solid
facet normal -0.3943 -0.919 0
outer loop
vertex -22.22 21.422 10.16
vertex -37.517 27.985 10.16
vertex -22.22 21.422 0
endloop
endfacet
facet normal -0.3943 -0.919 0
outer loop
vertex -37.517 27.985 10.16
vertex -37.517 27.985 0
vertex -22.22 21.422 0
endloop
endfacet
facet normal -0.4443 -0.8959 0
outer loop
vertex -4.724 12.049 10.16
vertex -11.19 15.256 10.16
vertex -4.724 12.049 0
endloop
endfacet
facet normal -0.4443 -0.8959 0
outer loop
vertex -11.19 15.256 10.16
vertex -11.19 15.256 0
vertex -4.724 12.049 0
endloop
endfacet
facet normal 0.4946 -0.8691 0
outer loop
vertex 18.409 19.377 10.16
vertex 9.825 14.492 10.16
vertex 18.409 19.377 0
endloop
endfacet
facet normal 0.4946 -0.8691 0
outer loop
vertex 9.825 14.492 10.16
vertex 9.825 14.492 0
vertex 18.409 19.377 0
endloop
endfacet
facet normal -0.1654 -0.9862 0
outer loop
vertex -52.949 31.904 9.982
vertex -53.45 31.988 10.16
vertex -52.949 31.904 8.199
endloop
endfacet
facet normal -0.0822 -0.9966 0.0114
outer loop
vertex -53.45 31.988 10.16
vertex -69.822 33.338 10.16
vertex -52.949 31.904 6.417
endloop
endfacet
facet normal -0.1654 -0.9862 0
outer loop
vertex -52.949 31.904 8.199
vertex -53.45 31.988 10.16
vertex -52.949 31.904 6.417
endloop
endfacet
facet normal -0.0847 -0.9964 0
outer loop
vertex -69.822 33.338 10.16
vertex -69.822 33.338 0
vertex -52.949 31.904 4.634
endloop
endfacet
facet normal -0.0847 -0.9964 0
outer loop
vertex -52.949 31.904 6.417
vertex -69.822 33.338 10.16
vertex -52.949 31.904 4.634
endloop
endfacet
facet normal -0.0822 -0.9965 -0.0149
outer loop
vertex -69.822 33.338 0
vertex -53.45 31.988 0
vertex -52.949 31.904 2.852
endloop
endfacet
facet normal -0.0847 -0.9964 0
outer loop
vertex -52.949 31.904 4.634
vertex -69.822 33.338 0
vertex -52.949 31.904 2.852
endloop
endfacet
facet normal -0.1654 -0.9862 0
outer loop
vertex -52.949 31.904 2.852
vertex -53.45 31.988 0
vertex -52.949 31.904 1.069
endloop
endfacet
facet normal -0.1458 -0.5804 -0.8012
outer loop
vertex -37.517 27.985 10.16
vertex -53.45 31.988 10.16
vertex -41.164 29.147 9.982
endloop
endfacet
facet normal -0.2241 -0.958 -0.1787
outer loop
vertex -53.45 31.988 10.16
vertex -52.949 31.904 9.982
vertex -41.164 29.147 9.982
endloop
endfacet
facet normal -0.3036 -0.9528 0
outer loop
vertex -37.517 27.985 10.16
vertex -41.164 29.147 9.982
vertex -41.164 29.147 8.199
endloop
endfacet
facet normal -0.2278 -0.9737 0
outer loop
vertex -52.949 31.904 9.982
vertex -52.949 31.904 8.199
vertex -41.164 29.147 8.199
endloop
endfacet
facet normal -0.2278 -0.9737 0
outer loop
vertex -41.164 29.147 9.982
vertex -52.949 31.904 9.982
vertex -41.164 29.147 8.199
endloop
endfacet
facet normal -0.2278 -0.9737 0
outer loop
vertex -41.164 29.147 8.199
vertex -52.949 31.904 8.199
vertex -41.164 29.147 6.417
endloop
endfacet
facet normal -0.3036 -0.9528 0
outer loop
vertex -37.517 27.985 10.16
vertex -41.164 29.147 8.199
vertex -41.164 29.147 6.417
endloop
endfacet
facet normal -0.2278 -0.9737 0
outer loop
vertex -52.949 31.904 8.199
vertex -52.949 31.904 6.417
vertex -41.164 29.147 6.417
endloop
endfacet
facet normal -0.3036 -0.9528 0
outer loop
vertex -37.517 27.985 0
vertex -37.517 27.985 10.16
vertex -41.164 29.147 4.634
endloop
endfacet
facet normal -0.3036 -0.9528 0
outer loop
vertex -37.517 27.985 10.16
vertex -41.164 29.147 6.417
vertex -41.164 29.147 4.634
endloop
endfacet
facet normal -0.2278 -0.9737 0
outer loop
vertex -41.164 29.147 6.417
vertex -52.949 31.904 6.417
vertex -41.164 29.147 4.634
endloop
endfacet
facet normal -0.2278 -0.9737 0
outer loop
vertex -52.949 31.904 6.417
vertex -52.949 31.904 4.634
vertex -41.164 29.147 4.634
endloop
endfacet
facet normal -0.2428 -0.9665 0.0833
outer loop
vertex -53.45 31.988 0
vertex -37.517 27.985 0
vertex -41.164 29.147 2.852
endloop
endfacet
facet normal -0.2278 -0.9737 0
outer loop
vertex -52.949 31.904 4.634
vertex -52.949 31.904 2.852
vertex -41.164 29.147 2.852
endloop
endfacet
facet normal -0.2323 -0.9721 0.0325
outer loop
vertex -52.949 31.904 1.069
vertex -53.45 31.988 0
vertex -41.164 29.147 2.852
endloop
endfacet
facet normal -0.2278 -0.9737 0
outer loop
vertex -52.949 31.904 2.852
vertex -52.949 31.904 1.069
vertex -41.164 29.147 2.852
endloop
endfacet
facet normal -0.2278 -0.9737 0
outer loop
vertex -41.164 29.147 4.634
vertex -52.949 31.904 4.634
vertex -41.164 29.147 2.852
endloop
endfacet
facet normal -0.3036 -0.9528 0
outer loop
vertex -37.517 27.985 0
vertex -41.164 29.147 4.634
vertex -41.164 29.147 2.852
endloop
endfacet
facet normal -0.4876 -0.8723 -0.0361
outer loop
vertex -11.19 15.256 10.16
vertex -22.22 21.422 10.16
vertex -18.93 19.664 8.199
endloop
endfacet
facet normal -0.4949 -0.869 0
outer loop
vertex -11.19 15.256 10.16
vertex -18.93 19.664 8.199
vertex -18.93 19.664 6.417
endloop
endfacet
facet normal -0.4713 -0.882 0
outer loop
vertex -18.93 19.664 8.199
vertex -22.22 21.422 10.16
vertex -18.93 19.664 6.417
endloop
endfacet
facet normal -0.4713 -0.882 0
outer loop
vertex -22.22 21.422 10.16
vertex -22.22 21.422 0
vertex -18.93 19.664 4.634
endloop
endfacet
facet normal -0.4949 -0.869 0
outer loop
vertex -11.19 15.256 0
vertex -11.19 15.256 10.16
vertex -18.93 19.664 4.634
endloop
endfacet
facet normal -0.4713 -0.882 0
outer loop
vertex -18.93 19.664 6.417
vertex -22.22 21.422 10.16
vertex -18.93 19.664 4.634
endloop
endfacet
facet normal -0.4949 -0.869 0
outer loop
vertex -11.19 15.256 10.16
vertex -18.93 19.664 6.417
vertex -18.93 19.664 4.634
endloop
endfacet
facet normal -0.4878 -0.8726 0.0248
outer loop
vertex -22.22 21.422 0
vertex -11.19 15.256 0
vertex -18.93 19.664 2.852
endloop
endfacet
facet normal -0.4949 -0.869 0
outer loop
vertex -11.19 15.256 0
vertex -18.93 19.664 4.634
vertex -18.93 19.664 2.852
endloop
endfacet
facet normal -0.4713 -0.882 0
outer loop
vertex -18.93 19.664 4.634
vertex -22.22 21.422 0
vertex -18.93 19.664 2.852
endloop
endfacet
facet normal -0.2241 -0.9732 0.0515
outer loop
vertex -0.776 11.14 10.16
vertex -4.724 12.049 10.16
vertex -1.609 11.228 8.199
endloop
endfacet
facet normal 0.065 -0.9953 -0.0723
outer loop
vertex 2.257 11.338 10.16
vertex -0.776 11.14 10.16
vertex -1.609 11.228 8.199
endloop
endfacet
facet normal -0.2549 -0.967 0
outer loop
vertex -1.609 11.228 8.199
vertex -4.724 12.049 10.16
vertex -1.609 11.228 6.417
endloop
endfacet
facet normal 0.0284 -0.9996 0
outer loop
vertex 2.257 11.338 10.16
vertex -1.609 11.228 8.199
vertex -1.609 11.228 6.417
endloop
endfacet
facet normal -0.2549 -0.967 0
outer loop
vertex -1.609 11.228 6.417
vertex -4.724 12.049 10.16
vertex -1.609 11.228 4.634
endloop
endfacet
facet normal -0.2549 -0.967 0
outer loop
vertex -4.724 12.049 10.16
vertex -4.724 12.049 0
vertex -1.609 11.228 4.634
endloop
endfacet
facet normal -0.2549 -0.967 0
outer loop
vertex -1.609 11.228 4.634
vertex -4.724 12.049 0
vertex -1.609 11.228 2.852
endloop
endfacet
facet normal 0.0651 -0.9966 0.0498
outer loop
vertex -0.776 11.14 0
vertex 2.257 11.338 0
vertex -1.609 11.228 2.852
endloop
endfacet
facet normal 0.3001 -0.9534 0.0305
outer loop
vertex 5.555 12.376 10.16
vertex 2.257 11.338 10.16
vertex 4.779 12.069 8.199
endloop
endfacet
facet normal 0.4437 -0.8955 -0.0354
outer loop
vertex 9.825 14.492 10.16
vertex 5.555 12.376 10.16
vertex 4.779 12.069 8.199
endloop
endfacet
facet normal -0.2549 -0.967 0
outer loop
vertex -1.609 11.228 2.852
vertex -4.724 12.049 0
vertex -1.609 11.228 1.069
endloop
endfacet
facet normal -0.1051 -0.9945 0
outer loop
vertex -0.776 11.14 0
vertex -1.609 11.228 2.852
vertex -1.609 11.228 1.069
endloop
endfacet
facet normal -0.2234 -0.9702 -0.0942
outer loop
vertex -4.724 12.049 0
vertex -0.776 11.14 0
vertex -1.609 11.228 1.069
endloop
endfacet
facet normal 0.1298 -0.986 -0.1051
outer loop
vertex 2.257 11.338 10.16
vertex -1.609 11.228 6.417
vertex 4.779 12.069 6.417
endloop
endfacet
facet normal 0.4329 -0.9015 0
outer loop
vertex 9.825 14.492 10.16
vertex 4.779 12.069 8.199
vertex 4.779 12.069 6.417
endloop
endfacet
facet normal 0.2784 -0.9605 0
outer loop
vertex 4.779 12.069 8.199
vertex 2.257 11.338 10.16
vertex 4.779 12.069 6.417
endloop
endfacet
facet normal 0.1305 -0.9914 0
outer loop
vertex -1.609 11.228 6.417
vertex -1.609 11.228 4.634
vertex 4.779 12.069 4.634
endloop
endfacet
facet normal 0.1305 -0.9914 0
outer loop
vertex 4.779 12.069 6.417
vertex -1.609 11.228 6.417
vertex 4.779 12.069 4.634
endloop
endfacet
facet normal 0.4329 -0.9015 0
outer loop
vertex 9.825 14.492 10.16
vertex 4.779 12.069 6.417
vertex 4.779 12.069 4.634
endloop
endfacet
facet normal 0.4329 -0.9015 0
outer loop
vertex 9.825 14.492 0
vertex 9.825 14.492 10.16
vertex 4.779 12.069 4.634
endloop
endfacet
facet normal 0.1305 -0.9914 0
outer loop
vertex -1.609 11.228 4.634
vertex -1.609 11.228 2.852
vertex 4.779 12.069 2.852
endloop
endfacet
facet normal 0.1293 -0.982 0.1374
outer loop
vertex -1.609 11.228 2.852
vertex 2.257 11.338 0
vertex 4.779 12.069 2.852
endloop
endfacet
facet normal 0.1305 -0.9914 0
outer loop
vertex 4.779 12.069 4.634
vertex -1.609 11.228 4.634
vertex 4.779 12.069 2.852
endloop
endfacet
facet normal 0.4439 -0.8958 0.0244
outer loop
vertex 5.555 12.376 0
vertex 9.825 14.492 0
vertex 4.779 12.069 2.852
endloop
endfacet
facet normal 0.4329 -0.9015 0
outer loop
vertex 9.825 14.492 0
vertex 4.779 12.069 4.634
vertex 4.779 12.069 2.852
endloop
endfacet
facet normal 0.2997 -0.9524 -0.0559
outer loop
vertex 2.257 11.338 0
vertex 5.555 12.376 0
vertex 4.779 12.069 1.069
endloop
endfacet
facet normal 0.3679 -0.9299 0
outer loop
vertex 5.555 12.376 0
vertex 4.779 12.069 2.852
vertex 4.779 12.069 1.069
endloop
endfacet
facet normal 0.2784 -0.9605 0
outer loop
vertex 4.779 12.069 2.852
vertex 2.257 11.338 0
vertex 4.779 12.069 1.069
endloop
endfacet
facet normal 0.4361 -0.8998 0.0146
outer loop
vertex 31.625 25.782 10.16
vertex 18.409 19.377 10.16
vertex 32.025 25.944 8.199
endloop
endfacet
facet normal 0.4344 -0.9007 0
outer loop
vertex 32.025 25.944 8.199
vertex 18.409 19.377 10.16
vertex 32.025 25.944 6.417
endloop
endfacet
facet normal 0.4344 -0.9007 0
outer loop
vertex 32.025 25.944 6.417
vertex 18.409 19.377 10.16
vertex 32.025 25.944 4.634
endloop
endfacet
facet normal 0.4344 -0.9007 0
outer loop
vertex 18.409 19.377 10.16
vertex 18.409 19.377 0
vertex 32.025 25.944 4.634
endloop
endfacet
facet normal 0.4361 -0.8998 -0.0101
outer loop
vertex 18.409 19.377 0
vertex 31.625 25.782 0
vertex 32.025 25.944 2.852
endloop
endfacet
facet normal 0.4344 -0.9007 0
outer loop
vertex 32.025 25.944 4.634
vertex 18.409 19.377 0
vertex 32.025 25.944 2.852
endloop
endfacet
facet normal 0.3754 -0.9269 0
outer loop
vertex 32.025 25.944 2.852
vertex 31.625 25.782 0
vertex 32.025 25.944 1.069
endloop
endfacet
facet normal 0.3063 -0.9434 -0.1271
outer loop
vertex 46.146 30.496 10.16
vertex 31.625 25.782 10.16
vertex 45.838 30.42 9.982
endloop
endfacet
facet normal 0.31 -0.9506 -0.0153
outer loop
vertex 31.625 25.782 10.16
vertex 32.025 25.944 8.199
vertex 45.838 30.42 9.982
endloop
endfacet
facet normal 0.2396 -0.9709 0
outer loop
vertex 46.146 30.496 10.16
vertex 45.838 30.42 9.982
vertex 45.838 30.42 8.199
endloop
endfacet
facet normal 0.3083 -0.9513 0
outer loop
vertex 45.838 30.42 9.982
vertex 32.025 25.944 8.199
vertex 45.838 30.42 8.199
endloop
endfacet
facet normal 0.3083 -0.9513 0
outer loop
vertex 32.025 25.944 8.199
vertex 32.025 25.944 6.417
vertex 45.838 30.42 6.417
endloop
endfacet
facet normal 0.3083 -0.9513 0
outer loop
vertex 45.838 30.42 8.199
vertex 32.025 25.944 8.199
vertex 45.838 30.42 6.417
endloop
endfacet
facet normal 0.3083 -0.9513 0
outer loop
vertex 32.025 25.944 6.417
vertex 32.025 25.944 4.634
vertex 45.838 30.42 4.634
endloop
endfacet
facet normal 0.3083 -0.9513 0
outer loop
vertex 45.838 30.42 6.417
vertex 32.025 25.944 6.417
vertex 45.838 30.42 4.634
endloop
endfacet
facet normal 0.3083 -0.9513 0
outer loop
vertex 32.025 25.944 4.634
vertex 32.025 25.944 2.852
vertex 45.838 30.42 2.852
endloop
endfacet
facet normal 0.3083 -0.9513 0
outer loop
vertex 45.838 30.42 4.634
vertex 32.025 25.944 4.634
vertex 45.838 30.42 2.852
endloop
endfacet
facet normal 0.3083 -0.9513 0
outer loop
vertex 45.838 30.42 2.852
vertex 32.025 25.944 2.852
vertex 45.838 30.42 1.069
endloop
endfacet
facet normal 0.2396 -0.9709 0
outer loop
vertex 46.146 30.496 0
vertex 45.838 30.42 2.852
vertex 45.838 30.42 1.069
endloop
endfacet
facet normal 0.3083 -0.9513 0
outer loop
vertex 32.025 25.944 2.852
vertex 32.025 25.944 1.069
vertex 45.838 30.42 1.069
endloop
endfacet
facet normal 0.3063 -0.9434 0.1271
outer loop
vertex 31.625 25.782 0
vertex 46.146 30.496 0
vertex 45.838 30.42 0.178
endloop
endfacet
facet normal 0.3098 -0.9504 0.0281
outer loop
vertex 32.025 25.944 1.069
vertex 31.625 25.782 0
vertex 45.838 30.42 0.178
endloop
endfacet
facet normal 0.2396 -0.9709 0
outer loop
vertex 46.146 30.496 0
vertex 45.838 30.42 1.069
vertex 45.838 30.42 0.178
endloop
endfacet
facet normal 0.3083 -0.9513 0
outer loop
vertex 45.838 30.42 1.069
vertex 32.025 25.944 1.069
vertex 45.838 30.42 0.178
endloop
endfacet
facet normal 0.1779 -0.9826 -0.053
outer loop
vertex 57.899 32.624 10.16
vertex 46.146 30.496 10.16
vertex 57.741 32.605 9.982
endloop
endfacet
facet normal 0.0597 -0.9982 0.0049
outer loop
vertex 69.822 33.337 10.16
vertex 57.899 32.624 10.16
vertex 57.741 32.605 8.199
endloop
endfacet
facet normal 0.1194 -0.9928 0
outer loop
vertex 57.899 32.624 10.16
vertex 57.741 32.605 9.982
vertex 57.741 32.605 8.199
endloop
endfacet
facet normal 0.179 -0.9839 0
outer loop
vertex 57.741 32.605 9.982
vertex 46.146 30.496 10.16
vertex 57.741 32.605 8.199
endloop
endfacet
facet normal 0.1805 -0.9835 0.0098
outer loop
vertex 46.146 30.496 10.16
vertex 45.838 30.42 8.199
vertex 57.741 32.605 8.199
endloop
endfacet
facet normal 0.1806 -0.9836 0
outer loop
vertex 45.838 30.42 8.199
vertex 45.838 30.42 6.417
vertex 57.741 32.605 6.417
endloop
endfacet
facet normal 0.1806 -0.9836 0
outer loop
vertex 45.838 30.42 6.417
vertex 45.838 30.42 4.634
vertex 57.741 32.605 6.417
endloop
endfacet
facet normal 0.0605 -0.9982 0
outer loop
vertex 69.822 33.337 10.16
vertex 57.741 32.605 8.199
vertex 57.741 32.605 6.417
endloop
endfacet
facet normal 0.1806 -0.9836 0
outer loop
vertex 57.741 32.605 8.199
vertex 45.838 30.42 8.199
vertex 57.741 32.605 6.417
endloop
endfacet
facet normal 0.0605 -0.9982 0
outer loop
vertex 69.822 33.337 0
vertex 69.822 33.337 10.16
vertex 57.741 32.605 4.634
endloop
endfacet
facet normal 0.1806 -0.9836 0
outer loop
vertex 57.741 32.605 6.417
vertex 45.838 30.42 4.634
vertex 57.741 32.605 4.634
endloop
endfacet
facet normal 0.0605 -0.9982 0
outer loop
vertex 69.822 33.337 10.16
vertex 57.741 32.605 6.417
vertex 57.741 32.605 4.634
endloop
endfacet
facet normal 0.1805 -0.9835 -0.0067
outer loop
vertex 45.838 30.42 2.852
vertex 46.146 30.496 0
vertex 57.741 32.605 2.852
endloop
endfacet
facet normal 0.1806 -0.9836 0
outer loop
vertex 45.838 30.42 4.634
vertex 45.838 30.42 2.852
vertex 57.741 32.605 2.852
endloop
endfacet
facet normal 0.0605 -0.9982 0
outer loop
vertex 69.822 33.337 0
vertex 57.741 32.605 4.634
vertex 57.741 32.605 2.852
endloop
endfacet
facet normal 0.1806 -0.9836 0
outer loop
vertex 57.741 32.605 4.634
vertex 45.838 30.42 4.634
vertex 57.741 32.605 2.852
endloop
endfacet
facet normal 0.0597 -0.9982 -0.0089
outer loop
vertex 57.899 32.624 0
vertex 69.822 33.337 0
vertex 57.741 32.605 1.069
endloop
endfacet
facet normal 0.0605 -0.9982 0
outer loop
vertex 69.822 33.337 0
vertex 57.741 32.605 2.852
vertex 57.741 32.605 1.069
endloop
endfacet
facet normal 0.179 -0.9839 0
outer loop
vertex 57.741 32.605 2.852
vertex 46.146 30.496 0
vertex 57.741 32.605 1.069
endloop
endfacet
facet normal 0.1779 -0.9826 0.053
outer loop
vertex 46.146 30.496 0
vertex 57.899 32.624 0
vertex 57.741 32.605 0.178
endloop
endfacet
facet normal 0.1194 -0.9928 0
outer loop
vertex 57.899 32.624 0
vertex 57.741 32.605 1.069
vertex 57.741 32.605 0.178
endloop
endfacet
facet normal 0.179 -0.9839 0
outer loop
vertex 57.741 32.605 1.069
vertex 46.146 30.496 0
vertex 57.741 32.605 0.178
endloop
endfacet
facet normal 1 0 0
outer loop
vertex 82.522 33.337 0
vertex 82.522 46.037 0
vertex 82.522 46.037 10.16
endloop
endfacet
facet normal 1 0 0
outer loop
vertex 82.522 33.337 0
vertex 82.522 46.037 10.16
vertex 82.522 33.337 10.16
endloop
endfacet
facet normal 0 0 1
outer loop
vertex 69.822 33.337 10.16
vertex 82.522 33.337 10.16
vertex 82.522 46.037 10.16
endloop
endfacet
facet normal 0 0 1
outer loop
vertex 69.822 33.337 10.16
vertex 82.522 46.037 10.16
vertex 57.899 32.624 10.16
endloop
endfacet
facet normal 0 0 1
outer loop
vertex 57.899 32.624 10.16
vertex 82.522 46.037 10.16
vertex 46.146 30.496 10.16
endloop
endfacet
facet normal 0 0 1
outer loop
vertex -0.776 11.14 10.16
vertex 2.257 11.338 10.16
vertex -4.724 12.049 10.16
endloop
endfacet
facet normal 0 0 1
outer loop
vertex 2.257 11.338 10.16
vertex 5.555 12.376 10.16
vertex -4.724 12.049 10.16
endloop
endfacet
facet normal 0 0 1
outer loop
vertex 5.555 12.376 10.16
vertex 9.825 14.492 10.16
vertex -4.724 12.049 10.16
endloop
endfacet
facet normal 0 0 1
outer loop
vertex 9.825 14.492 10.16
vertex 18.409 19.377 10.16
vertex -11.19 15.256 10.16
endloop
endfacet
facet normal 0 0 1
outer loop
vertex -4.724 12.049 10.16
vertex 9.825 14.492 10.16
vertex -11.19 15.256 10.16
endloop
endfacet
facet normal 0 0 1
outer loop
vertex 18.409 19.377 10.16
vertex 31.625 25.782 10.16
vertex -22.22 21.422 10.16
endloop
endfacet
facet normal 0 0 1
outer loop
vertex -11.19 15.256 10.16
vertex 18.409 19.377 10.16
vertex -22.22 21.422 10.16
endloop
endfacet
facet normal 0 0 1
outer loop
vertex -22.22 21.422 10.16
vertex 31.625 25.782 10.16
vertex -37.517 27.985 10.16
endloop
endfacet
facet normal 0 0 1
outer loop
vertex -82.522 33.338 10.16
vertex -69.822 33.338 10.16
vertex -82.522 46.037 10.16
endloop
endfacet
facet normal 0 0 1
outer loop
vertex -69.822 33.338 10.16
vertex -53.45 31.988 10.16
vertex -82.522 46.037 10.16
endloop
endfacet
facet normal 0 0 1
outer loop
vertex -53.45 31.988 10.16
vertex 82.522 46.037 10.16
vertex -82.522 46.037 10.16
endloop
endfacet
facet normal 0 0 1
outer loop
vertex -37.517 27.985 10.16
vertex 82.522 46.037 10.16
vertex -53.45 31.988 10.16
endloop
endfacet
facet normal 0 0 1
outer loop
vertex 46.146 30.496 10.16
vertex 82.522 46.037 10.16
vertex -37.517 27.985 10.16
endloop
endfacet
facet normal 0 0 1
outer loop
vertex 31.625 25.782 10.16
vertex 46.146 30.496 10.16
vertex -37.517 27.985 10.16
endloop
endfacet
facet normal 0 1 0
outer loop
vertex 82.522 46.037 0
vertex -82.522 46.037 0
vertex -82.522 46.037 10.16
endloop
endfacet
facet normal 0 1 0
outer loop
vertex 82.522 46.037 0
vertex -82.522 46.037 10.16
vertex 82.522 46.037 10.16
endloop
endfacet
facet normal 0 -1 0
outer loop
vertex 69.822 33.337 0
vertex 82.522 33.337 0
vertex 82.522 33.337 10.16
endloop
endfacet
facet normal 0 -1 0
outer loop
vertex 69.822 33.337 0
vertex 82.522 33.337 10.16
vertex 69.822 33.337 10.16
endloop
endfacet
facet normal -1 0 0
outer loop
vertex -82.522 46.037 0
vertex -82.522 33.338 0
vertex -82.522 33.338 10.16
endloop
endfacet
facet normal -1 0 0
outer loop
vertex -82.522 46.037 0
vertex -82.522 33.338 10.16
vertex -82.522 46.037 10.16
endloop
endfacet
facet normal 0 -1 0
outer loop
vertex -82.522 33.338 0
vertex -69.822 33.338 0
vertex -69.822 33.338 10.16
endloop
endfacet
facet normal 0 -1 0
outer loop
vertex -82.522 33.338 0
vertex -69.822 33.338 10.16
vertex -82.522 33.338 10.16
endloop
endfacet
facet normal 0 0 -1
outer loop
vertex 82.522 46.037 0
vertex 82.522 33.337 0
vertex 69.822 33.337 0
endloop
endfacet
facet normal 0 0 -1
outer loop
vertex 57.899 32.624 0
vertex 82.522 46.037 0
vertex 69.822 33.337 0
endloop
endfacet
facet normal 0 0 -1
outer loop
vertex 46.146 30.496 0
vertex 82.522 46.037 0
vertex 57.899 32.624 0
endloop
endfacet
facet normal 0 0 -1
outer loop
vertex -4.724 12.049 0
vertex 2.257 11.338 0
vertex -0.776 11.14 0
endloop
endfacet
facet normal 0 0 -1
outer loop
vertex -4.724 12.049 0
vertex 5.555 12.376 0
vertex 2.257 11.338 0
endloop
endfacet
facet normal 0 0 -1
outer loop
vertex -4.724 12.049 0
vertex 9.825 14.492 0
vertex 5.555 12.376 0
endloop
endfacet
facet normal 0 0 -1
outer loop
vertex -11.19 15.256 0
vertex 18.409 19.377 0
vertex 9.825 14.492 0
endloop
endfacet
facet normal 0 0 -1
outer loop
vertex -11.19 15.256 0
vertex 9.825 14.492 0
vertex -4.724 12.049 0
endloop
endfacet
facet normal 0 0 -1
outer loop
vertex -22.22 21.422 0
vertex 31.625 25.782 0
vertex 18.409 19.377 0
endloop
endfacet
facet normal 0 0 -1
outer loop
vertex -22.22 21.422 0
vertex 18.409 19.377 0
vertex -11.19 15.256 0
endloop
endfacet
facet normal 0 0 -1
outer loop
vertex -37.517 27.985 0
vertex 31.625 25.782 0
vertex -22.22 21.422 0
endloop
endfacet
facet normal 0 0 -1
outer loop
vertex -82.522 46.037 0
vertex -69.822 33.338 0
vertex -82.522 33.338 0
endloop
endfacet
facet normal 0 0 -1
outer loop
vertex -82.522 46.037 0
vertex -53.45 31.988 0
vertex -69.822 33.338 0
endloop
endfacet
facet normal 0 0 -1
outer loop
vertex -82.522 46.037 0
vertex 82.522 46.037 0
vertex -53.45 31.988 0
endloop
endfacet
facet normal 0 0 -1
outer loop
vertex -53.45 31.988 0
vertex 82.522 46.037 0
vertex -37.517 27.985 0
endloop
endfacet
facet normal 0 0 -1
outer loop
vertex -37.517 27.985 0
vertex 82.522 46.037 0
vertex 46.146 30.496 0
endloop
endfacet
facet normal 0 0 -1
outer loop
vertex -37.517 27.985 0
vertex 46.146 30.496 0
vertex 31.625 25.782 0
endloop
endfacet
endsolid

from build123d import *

# Parameters (mm, degrees)
BOSS_EXTRUDE1_DEPTH = 10.16


with BuildPart() as part:
    # Sketch2 → Boss-Extrude1 (new body)
    with BuildSketch(Plane.XY):
        with BuildLine():
            Line((-69.821896726, 33.3375), (-82.521896726, 33.3375))
            Line((-82.521896726, 33.3375), (-82.521896726, 46.037499958))
            Line((-82.521896726, 46.037499958), (82.521896726, 46.037499958))
            Line((82.521896726, 46.037499958), (82.521896726, 33.337499958))
            Line((82.521896726, 33.337499958), (69.821896726, 33.337499958))
            add(Edge.make_bspline(
                [(-69.821896726, 33.3375), (-69.695748082, 33.337499958), (-69.444014878, 33.33688898), (-68.974776454, 33.334139576), (-68.311523611, 33.326807968), (-67.535738646, 33.313061622), (-66.649871791, 33.289235879), (-65.583119966, 33.250751769), (-64.375109134, 33.192119398), (-63.166065476, 33.118845233), (-61.958257755, 33.030940192), (-60.75156183, 32.928417725), (-58.340858198, 32.694168713), (-55.636700095, 32.354076931), (-52.04746615, 31.784437981), (-47.597259295, 30.87442217), (-44.068683145, 30.003709231), (-40.578319771, 28.992751035), (-37.698257404, 28.058512705), (-35.412490367, 27.256928735), (-33.146112621, 26.402109783), (-30.899989094, 25.495391202), (-28.118713815, 24.298818506), (-24.824137204, 22.766002302), (-21.044263598, 20.845993076), (-16.988495065, 18.604884197), (-13.163922242, 16.384998059), (-9.682433774, 14.378110033), (-6.752766683, 12.839370164), (-4.260575031, 11.818773782), (-2.289648997, 11.300020037), (-0.727513295, 11.098155491), (0.727513365, 11.098155139), (2.289648769, 11.300020508), (4.260575544, 11.818772947), (6.752765579, 12.839371822), (9.682435908, 14.378106921), (13.163918453, 16.385003517), (16.988501351, 18.604875175), (21.044252982, 20.84600832), (25.364138003, 23.040262643), (29.22052055, 24.802279565), (32.579499149, 26.188445915), (35.412494909, 27.256909268), (37.698265231, 28.058522908), (40.578297255, 28.992744505), (44.068728971, 30.00371395), (48.185272464, 31.019537163), (52.346368543, 31.835595144), (55.937275824, 32.390662735), (58.943373068, 32.756370776), (61.353326154, 32.990636746), (63.469107465, 33.144482739), (65.279425319, 33.239756175), (66.64951597, 33.28923593), (67.535784341, 33.313061615), (68.311545278, 33.326807964), (68.974773229, 33.334139576), (69.444018374, 33.33688898), (69.695748082, 33.337499958), (69.821896726, 33.337499958)],
                knots=[0.083325531, 0.083325531, 0.083325531, 0.083325531, 0.083325531, 0.086723077, 0.090120623, 0.093518169, 0.096915715, 0.103710808, 0.1105059, 0.117300992, 0.124096085, 0.130891177, 0.137686269, 0.14448136, 0.178456812, 0.192046993, 0.219227344, 0.246407696, 0.259997928, 0.273588159, 0.287178391, 0.300768623, 0.314358811, 0.327948999, 0.355129375, 0.382309728, 0.409490081, 0.431935904, 0.454381728, 0.472501988, 0.483716791, 0.492234559, 0.5, 0.507765441, 0.516283209, 0.527498012, 0.545618272, 0.568064096, 0.590509919, 0.617690272, 0.644870625, 0.672051001, 0.699231377, 0.712821609, 0.726411841, 0.740002072, 0.753592304, 0.780772656, 0.807953007, 0.835133369, 0.84872355, 0.862313731, 0.875903915, 0.8894941, 0.896289192, 0.903084285, 0.906481831, 0.909879377, 0.913276923, 0.916674469, 0.916674469, 0.916674469, 0.916674469, 0.916674469], degree=4))
        make_face()
    extrude(amount=BOSS_EXTRUDE1_DEPTH)


solid = part.part
